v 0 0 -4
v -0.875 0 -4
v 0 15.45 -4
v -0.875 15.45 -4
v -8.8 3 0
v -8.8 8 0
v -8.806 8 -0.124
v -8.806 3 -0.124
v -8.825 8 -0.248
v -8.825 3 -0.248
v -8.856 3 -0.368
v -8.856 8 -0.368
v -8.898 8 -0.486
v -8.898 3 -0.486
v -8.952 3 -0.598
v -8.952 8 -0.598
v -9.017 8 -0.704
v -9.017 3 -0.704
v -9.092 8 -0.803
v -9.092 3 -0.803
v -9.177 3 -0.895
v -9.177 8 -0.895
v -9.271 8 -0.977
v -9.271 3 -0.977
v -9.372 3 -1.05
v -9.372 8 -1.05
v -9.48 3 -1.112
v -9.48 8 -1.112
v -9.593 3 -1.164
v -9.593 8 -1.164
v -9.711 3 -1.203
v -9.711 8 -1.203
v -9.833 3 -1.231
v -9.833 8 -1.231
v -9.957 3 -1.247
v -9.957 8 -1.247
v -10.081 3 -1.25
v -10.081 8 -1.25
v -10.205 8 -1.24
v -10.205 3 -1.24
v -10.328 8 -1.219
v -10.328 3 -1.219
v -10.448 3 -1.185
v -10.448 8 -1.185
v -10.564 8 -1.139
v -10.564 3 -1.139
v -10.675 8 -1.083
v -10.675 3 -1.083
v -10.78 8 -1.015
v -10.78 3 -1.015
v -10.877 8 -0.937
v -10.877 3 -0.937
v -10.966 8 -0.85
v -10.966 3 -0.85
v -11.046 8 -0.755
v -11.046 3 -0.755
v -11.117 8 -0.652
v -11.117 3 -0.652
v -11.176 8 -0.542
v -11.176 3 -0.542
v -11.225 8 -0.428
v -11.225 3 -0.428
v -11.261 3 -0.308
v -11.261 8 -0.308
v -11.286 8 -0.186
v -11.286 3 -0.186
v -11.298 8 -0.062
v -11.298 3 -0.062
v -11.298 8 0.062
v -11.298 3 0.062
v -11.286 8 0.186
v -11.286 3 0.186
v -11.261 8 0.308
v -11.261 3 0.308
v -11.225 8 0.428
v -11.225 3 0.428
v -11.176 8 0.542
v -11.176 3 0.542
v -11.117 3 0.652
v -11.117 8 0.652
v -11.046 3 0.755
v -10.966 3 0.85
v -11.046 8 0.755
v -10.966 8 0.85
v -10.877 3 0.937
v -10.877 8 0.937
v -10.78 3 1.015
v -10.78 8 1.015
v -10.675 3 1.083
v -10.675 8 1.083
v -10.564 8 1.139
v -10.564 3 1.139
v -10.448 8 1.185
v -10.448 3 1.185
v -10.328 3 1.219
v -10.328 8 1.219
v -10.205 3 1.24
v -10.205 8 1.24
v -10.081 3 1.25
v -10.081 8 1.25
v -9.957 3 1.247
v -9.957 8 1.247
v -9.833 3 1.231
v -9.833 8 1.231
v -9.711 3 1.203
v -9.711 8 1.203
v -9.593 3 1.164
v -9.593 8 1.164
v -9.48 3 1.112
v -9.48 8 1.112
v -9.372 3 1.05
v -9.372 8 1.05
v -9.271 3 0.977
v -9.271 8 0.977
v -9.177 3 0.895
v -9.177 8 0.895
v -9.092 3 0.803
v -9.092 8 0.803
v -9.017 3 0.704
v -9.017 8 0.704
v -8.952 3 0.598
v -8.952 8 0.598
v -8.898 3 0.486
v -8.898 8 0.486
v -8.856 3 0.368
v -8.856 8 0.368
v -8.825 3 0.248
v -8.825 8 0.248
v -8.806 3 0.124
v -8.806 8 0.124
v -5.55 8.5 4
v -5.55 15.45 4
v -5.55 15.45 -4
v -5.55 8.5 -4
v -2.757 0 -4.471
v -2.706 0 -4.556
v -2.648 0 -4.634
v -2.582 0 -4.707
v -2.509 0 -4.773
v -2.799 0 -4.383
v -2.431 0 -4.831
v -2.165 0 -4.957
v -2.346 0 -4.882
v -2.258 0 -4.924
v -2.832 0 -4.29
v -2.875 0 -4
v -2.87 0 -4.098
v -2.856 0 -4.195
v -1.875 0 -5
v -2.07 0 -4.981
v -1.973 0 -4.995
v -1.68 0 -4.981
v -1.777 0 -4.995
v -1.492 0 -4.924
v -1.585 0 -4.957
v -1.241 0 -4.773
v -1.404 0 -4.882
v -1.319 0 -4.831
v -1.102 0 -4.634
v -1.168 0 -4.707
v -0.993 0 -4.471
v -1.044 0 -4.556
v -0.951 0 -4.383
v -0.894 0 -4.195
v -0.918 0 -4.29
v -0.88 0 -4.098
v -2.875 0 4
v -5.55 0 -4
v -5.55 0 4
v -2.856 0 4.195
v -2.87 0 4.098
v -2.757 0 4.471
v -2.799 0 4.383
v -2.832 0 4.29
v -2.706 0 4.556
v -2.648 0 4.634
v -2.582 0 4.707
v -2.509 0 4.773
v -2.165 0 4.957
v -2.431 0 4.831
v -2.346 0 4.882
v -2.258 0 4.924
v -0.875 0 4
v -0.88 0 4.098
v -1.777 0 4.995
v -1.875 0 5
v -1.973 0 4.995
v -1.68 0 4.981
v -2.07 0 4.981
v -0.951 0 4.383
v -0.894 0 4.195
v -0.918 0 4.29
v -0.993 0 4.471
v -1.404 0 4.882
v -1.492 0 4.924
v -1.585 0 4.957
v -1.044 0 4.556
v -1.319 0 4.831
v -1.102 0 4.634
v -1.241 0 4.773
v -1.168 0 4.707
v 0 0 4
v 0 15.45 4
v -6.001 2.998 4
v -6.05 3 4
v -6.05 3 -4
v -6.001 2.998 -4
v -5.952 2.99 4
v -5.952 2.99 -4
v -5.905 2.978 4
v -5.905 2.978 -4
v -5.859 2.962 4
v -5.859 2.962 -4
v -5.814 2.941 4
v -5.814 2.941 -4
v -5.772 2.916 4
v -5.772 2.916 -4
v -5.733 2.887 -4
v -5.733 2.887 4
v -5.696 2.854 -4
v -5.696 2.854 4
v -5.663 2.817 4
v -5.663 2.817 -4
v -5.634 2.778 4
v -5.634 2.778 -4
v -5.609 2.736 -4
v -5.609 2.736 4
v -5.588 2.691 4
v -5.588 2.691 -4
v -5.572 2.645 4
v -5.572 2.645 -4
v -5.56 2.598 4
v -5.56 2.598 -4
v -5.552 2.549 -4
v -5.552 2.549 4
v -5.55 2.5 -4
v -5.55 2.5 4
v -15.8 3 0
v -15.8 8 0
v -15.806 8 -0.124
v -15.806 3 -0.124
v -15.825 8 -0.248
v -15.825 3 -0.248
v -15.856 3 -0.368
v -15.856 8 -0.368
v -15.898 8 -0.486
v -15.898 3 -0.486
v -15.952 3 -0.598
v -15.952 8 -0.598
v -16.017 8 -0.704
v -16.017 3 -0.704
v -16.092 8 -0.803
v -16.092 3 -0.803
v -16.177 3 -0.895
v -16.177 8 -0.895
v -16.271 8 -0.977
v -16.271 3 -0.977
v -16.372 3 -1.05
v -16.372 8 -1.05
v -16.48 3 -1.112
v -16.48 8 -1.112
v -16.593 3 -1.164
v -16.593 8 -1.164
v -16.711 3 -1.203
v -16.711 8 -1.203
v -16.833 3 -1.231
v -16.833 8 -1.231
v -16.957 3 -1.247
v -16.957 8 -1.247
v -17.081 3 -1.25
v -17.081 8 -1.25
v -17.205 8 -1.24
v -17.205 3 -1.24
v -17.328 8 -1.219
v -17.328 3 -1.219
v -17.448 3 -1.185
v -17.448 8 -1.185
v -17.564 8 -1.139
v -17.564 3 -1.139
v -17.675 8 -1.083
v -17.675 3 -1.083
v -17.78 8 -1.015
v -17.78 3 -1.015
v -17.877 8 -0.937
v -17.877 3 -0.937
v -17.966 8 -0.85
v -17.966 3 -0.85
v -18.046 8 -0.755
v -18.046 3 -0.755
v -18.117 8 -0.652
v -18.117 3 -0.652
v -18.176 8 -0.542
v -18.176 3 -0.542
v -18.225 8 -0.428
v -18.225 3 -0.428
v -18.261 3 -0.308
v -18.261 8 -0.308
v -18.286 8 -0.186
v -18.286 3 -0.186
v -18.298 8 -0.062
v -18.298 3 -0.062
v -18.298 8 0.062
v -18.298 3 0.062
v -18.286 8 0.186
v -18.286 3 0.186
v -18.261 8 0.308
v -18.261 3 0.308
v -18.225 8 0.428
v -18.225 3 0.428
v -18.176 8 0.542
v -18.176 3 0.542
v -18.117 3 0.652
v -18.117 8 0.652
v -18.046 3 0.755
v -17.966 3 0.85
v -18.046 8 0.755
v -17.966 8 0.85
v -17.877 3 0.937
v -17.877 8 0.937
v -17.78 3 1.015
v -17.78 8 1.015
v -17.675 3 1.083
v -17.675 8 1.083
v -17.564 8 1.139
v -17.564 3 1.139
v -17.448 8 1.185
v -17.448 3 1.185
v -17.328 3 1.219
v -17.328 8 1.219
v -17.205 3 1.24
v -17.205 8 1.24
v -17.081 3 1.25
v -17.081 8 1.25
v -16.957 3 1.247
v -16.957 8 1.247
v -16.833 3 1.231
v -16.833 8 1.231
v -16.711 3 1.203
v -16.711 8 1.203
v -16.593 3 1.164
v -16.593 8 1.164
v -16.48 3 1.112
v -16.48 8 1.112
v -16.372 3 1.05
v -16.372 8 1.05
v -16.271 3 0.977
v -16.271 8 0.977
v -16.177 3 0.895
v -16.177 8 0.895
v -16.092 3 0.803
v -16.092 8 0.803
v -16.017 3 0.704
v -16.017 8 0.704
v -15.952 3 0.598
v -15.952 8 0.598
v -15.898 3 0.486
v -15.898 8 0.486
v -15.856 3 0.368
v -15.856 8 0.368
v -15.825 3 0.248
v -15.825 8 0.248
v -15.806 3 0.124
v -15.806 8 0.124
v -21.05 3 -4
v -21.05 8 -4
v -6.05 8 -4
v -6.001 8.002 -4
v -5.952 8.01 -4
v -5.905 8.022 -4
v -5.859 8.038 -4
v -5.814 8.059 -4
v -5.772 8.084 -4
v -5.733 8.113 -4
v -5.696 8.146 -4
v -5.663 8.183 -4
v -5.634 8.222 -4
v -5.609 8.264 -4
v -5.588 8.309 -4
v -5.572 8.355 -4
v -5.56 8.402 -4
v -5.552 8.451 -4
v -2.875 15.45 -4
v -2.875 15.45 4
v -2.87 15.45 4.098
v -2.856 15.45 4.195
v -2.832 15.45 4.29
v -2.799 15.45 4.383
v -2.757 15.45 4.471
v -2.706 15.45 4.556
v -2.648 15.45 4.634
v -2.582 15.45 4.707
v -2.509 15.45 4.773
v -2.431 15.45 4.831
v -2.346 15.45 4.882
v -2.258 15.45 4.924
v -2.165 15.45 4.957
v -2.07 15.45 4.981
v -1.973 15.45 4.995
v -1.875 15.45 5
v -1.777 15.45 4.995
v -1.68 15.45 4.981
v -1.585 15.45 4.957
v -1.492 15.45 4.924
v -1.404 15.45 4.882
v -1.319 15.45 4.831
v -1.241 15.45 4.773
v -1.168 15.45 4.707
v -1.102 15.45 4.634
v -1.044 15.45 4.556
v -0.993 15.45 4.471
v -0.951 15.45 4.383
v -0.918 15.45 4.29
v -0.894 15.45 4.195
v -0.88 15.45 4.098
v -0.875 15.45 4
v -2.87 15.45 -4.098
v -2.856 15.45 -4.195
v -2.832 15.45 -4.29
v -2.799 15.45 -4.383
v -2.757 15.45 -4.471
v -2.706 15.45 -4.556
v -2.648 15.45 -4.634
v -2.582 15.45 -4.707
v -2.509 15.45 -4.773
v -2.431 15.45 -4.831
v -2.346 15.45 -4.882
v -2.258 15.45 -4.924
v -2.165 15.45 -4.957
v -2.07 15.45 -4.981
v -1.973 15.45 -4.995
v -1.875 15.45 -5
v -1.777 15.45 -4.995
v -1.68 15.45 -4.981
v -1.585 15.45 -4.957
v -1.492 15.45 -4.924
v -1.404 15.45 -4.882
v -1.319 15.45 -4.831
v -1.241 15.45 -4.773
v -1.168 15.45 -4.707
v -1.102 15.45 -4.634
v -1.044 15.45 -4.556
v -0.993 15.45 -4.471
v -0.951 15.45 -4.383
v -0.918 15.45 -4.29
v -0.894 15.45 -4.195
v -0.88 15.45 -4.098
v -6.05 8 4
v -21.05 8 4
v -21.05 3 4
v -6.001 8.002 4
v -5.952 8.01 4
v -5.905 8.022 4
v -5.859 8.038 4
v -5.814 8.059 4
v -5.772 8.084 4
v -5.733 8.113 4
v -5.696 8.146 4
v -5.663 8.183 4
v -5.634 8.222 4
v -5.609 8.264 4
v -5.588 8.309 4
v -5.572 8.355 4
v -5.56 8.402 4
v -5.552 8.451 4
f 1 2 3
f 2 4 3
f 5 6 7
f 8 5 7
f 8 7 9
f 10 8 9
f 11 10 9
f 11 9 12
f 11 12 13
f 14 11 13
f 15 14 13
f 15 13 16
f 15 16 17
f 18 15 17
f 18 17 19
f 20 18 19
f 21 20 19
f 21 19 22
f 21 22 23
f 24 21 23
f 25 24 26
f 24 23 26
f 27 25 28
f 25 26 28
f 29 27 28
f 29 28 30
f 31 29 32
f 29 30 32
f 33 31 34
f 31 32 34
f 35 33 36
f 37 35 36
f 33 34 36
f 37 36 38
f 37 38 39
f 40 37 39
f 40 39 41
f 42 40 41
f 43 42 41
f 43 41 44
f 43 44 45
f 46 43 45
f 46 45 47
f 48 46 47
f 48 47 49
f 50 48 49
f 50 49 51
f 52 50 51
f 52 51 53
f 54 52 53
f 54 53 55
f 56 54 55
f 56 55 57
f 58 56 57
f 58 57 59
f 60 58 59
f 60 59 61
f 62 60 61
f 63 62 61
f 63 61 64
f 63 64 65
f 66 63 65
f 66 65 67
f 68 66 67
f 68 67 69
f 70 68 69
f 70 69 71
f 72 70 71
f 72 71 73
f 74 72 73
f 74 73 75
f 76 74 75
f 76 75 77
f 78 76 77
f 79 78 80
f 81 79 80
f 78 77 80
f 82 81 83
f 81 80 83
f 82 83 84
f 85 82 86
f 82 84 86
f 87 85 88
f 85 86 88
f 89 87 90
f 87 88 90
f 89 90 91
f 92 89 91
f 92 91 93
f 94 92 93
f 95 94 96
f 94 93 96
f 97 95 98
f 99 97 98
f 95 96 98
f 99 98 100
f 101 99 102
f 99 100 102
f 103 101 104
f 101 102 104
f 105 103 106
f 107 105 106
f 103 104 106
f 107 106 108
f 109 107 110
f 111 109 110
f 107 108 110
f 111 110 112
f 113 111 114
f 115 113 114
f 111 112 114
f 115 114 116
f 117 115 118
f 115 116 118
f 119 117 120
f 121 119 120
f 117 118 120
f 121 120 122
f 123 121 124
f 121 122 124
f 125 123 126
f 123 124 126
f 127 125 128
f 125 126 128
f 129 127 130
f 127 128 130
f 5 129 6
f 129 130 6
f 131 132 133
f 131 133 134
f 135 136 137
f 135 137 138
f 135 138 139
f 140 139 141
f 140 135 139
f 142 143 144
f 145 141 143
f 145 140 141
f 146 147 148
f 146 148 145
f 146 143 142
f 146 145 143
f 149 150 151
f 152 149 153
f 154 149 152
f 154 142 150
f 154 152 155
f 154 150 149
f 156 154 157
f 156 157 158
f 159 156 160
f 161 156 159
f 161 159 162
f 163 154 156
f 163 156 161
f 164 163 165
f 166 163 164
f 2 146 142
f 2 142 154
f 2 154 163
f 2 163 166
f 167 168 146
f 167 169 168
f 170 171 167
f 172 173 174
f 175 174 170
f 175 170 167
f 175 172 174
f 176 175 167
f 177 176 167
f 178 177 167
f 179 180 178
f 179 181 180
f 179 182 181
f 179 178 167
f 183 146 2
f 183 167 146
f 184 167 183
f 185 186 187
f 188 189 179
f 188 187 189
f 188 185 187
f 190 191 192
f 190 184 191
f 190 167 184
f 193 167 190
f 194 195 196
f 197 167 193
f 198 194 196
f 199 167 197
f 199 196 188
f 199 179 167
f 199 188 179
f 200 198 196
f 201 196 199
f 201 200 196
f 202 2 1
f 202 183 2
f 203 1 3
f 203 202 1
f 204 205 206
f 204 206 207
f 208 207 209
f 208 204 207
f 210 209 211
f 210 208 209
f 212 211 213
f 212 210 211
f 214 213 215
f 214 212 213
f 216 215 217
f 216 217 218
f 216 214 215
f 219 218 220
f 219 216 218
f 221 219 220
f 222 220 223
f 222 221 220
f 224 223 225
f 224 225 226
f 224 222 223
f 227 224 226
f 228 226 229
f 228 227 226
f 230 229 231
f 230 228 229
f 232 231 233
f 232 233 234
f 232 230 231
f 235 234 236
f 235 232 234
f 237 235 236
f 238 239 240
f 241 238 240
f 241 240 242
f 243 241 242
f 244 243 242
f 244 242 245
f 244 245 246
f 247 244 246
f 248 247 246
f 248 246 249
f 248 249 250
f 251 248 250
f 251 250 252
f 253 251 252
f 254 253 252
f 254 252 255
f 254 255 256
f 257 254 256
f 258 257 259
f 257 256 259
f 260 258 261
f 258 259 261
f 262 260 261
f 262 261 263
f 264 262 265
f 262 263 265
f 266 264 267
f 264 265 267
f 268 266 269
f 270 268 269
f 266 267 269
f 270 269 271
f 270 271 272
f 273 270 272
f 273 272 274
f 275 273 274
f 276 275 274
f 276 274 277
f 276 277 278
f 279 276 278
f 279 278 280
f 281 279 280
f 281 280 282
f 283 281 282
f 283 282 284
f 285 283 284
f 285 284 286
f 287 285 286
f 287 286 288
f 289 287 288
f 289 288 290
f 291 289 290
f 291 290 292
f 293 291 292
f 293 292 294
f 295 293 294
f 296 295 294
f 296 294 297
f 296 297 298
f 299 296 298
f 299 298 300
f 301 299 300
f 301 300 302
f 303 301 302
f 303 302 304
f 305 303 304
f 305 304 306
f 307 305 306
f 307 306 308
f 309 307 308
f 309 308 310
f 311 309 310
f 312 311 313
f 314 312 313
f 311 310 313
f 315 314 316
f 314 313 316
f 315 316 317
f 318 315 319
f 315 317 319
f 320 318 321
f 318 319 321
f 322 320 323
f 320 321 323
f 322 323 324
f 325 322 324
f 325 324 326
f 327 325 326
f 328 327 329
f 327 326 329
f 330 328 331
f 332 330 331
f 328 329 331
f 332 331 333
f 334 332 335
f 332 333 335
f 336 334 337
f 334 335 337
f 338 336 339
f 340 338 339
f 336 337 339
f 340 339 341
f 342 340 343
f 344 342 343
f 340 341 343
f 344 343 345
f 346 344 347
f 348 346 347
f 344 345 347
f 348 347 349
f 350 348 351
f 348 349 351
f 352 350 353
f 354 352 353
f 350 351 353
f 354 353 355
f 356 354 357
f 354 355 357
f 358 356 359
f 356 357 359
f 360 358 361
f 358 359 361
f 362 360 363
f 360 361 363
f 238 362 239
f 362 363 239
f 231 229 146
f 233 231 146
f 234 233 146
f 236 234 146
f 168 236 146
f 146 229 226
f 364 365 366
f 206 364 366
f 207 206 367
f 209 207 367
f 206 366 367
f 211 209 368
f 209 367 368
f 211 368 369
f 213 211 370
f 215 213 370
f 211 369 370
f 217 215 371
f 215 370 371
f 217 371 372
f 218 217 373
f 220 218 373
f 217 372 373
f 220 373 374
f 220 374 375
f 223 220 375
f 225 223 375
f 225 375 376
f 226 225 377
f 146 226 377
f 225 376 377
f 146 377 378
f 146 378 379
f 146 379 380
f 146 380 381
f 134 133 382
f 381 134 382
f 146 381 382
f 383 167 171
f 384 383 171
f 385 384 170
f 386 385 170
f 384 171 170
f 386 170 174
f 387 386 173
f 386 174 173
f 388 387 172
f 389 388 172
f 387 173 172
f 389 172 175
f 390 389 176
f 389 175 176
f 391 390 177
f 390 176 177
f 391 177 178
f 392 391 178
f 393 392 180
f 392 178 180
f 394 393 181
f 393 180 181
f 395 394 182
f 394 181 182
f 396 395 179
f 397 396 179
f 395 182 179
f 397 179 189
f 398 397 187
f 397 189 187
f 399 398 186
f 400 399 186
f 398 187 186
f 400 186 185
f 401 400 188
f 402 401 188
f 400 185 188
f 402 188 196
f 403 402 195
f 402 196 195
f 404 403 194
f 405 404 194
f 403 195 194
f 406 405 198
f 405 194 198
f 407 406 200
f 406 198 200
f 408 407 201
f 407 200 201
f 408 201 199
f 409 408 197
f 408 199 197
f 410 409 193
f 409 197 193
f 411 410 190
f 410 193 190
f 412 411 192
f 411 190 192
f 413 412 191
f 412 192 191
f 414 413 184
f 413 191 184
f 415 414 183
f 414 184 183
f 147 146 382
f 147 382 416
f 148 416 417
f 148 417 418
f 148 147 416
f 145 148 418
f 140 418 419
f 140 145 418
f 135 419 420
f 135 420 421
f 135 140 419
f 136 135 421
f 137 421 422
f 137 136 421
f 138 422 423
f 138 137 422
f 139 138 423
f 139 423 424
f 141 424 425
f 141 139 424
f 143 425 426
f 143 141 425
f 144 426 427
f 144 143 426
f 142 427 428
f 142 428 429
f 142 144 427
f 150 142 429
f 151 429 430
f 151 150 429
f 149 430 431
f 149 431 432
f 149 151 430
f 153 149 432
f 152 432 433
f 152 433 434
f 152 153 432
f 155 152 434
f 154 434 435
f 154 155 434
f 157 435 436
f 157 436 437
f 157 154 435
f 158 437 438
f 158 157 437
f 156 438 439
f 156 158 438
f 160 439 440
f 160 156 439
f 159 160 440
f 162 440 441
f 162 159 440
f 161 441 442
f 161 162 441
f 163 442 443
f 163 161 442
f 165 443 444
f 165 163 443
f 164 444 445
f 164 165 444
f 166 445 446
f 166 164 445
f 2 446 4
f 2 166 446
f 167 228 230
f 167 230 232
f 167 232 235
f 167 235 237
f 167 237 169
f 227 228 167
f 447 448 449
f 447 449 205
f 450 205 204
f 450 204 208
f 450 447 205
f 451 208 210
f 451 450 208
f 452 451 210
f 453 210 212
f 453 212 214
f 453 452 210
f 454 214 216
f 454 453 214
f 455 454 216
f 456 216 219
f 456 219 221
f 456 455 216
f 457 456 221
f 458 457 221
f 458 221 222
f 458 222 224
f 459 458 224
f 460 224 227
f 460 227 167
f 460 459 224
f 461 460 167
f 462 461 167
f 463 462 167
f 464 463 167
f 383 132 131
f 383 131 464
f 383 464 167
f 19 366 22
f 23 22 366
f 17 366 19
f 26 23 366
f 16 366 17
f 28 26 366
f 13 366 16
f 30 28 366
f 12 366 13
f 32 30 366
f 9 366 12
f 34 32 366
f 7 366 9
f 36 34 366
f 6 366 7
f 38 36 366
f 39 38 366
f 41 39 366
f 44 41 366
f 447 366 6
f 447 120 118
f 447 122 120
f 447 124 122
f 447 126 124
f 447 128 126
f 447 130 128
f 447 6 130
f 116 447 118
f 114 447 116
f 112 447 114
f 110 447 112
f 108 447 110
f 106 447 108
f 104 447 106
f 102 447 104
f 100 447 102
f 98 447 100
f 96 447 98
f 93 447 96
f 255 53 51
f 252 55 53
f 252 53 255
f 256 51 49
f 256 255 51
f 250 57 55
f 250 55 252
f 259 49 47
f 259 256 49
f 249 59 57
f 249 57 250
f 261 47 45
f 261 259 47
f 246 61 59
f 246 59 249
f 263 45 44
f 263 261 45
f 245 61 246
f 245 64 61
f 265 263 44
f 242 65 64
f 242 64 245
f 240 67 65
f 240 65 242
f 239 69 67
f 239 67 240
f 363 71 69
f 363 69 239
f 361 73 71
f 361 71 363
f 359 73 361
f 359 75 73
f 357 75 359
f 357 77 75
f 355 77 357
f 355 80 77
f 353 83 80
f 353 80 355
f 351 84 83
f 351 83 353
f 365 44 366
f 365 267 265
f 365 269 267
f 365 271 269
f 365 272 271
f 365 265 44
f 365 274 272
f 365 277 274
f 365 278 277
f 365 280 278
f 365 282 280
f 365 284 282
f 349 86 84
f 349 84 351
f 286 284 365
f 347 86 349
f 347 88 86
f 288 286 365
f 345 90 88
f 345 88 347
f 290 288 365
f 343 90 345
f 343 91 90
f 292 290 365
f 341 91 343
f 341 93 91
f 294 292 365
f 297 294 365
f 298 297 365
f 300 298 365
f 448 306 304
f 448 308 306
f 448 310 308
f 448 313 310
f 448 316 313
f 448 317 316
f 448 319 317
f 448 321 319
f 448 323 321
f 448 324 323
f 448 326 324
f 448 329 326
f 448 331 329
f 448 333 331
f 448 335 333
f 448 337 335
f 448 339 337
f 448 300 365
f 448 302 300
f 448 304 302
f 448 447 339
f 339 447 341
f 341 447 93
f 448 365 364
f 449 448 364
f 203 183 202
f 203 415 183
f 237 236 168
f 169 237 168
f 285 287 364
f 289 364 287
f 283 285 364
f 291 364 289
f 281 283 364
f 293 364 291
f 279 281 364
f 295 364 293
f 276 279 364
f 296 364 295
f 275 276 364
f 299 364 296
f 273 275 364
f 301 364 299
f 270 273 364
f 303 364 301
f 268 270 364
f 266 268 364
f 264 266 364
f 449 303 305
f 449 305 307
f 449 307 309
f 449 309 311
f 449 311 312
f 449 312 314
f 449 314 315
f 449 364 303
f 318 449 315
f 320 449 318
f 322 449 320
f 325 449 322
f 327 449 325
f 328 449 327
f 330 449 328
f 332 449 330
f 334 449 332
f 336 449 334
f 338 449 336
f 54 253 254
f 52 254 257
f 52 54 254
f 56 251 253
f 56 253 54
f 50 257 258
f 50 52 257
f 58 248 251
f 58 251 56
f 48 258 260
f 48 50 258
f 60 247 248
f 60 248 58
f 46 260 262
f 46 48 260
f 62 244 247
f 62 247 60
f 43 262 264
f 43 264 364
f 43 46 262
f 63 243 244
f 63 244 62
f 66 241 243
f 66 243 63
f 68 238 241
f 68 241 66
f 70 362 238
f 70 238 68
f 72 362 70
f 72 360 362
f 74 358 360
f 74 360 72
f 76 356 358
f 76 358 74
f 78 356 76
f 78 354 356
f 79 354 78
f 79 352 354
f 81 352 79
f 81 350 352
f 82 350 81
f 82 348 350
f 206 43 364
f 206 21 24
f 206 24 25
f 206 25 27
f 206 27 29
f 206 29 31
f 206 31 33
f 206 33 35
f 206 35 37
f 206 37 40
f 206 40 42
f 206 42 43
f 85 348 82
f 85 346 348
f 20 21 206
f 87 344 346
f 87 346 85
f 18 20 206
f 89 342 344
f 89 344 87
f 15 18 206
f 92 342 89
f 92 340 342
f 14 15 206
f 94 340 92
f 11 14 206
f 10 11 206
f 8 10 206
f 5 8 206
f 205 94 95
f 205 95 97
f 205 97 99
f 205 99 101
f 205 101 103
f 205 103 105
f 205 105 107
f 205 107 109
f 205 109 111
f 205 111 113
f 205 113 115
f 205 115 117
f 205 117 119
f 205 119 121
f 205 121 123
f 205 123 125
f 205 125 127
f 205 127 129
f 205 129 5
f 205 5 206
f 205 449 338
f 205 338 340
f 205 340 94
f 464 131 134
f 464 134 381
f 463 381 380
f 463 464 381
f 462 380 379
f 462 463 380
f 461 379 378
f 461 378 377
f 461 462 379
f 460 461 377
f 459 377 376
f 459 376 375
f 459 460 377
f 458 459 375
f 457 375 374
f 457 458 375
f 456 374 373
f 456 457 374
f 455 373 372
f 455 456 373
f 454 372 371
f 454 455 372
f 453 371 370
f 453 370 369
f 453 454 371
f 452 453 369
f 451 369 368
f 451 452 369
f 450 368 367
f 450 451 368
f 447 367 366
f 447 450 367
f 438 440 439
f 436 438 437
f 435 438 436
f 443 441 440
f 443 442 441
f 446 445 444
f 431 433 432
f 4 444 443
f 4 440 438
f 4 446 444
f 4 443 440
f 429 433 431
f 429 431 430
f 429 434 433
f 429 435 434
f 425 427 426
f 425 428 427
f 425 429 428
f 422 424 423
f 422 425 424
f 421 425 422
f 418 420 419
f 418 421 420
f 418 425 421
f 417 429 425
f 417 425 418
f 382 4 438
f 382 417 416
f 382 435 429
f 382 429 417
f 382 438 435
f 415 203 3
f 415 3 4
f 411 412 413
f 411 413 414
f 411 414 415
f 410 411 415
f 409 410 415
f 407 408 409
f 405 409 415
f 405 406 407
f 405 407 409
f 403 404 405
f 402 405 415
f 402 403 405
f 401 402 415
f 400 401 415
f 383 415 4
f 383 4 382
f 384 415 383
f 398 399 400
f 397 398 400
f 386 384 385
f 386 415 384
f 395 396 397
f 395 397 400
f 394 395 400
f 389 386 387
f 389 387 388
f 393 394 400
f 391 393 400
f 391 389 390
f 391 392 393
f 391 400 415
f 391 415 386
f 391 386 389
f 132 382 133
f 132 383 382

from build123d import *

# Parameters (mm, degrees)
BOSS_EXTRUDE3_DEPTH   = 4
BOSS_EXTRUDE4_DEPTH   = 15.45
M3X0_5_TAPPED_HOLE1_D = 2.5


with BuildPart() as part:
    # Sketch1 → Boss-Extrude3 (new, symmetric)
    with BuildSketch(Plane.XY):
        with BuildLine():
            Line((0, 0), (0, 15.45))
            Line((0, 15.45), (-5.55, 15.45))
            Line((-5.55, 15.45), (-5.55, 8.5))
            ThreePointArc((-5.55, 8.5), (-5.696446609, 8.146446609), (-6.05, 8))
            Line((-6.05, 8), (-21.05, 8))
            Line((-21.05, 8), (-21.05, 3))
            Line((-21.05, 3), (-6.05, 3))
            ThreePointArc((-6.05, 3), (-5.696446609, 2.853553391), (-5.55, 2.5))
            Line((-5.55, 2.5), (-5.55, 0))
            Line((-5.55, 0), (0, 0))
        make_face()
    extrude(amount=BOSS_EXTRUDE3_DEPTH, both=True)

    # Sketch2 → Boss-Extrude4 (add)
    with BuildSketch(Plane.XZ):
        with BuildLine():
            Line((-0.875, 4), (-2.875, 4))
            ThreePointArc((-2.875, 4), (-1.875, 5), (-0.875, 4))
        make_face()
        with BuildLine():
            Line((-0.875, -4), (-2.875, -4))
            ThreePointArc((-2.875, -4), (-1.875, -5), (-0.875, -4))
        make_face()
    extrude(amount=-BOSS_EXTRUDE4_DEPTH)

    # M3x0.5 Tapped Hole1 (through all)
    with Locations(Plane(origin=(0, 3, 0), x_dir=(-1, 0, 0), z_dir=(0, -1, 0))):
        with Locations((17.05, 0), (10.05, 0)):
            Hole(M3X0_5_TAPPED_HOLE1_D / 2)


solid = part.part
